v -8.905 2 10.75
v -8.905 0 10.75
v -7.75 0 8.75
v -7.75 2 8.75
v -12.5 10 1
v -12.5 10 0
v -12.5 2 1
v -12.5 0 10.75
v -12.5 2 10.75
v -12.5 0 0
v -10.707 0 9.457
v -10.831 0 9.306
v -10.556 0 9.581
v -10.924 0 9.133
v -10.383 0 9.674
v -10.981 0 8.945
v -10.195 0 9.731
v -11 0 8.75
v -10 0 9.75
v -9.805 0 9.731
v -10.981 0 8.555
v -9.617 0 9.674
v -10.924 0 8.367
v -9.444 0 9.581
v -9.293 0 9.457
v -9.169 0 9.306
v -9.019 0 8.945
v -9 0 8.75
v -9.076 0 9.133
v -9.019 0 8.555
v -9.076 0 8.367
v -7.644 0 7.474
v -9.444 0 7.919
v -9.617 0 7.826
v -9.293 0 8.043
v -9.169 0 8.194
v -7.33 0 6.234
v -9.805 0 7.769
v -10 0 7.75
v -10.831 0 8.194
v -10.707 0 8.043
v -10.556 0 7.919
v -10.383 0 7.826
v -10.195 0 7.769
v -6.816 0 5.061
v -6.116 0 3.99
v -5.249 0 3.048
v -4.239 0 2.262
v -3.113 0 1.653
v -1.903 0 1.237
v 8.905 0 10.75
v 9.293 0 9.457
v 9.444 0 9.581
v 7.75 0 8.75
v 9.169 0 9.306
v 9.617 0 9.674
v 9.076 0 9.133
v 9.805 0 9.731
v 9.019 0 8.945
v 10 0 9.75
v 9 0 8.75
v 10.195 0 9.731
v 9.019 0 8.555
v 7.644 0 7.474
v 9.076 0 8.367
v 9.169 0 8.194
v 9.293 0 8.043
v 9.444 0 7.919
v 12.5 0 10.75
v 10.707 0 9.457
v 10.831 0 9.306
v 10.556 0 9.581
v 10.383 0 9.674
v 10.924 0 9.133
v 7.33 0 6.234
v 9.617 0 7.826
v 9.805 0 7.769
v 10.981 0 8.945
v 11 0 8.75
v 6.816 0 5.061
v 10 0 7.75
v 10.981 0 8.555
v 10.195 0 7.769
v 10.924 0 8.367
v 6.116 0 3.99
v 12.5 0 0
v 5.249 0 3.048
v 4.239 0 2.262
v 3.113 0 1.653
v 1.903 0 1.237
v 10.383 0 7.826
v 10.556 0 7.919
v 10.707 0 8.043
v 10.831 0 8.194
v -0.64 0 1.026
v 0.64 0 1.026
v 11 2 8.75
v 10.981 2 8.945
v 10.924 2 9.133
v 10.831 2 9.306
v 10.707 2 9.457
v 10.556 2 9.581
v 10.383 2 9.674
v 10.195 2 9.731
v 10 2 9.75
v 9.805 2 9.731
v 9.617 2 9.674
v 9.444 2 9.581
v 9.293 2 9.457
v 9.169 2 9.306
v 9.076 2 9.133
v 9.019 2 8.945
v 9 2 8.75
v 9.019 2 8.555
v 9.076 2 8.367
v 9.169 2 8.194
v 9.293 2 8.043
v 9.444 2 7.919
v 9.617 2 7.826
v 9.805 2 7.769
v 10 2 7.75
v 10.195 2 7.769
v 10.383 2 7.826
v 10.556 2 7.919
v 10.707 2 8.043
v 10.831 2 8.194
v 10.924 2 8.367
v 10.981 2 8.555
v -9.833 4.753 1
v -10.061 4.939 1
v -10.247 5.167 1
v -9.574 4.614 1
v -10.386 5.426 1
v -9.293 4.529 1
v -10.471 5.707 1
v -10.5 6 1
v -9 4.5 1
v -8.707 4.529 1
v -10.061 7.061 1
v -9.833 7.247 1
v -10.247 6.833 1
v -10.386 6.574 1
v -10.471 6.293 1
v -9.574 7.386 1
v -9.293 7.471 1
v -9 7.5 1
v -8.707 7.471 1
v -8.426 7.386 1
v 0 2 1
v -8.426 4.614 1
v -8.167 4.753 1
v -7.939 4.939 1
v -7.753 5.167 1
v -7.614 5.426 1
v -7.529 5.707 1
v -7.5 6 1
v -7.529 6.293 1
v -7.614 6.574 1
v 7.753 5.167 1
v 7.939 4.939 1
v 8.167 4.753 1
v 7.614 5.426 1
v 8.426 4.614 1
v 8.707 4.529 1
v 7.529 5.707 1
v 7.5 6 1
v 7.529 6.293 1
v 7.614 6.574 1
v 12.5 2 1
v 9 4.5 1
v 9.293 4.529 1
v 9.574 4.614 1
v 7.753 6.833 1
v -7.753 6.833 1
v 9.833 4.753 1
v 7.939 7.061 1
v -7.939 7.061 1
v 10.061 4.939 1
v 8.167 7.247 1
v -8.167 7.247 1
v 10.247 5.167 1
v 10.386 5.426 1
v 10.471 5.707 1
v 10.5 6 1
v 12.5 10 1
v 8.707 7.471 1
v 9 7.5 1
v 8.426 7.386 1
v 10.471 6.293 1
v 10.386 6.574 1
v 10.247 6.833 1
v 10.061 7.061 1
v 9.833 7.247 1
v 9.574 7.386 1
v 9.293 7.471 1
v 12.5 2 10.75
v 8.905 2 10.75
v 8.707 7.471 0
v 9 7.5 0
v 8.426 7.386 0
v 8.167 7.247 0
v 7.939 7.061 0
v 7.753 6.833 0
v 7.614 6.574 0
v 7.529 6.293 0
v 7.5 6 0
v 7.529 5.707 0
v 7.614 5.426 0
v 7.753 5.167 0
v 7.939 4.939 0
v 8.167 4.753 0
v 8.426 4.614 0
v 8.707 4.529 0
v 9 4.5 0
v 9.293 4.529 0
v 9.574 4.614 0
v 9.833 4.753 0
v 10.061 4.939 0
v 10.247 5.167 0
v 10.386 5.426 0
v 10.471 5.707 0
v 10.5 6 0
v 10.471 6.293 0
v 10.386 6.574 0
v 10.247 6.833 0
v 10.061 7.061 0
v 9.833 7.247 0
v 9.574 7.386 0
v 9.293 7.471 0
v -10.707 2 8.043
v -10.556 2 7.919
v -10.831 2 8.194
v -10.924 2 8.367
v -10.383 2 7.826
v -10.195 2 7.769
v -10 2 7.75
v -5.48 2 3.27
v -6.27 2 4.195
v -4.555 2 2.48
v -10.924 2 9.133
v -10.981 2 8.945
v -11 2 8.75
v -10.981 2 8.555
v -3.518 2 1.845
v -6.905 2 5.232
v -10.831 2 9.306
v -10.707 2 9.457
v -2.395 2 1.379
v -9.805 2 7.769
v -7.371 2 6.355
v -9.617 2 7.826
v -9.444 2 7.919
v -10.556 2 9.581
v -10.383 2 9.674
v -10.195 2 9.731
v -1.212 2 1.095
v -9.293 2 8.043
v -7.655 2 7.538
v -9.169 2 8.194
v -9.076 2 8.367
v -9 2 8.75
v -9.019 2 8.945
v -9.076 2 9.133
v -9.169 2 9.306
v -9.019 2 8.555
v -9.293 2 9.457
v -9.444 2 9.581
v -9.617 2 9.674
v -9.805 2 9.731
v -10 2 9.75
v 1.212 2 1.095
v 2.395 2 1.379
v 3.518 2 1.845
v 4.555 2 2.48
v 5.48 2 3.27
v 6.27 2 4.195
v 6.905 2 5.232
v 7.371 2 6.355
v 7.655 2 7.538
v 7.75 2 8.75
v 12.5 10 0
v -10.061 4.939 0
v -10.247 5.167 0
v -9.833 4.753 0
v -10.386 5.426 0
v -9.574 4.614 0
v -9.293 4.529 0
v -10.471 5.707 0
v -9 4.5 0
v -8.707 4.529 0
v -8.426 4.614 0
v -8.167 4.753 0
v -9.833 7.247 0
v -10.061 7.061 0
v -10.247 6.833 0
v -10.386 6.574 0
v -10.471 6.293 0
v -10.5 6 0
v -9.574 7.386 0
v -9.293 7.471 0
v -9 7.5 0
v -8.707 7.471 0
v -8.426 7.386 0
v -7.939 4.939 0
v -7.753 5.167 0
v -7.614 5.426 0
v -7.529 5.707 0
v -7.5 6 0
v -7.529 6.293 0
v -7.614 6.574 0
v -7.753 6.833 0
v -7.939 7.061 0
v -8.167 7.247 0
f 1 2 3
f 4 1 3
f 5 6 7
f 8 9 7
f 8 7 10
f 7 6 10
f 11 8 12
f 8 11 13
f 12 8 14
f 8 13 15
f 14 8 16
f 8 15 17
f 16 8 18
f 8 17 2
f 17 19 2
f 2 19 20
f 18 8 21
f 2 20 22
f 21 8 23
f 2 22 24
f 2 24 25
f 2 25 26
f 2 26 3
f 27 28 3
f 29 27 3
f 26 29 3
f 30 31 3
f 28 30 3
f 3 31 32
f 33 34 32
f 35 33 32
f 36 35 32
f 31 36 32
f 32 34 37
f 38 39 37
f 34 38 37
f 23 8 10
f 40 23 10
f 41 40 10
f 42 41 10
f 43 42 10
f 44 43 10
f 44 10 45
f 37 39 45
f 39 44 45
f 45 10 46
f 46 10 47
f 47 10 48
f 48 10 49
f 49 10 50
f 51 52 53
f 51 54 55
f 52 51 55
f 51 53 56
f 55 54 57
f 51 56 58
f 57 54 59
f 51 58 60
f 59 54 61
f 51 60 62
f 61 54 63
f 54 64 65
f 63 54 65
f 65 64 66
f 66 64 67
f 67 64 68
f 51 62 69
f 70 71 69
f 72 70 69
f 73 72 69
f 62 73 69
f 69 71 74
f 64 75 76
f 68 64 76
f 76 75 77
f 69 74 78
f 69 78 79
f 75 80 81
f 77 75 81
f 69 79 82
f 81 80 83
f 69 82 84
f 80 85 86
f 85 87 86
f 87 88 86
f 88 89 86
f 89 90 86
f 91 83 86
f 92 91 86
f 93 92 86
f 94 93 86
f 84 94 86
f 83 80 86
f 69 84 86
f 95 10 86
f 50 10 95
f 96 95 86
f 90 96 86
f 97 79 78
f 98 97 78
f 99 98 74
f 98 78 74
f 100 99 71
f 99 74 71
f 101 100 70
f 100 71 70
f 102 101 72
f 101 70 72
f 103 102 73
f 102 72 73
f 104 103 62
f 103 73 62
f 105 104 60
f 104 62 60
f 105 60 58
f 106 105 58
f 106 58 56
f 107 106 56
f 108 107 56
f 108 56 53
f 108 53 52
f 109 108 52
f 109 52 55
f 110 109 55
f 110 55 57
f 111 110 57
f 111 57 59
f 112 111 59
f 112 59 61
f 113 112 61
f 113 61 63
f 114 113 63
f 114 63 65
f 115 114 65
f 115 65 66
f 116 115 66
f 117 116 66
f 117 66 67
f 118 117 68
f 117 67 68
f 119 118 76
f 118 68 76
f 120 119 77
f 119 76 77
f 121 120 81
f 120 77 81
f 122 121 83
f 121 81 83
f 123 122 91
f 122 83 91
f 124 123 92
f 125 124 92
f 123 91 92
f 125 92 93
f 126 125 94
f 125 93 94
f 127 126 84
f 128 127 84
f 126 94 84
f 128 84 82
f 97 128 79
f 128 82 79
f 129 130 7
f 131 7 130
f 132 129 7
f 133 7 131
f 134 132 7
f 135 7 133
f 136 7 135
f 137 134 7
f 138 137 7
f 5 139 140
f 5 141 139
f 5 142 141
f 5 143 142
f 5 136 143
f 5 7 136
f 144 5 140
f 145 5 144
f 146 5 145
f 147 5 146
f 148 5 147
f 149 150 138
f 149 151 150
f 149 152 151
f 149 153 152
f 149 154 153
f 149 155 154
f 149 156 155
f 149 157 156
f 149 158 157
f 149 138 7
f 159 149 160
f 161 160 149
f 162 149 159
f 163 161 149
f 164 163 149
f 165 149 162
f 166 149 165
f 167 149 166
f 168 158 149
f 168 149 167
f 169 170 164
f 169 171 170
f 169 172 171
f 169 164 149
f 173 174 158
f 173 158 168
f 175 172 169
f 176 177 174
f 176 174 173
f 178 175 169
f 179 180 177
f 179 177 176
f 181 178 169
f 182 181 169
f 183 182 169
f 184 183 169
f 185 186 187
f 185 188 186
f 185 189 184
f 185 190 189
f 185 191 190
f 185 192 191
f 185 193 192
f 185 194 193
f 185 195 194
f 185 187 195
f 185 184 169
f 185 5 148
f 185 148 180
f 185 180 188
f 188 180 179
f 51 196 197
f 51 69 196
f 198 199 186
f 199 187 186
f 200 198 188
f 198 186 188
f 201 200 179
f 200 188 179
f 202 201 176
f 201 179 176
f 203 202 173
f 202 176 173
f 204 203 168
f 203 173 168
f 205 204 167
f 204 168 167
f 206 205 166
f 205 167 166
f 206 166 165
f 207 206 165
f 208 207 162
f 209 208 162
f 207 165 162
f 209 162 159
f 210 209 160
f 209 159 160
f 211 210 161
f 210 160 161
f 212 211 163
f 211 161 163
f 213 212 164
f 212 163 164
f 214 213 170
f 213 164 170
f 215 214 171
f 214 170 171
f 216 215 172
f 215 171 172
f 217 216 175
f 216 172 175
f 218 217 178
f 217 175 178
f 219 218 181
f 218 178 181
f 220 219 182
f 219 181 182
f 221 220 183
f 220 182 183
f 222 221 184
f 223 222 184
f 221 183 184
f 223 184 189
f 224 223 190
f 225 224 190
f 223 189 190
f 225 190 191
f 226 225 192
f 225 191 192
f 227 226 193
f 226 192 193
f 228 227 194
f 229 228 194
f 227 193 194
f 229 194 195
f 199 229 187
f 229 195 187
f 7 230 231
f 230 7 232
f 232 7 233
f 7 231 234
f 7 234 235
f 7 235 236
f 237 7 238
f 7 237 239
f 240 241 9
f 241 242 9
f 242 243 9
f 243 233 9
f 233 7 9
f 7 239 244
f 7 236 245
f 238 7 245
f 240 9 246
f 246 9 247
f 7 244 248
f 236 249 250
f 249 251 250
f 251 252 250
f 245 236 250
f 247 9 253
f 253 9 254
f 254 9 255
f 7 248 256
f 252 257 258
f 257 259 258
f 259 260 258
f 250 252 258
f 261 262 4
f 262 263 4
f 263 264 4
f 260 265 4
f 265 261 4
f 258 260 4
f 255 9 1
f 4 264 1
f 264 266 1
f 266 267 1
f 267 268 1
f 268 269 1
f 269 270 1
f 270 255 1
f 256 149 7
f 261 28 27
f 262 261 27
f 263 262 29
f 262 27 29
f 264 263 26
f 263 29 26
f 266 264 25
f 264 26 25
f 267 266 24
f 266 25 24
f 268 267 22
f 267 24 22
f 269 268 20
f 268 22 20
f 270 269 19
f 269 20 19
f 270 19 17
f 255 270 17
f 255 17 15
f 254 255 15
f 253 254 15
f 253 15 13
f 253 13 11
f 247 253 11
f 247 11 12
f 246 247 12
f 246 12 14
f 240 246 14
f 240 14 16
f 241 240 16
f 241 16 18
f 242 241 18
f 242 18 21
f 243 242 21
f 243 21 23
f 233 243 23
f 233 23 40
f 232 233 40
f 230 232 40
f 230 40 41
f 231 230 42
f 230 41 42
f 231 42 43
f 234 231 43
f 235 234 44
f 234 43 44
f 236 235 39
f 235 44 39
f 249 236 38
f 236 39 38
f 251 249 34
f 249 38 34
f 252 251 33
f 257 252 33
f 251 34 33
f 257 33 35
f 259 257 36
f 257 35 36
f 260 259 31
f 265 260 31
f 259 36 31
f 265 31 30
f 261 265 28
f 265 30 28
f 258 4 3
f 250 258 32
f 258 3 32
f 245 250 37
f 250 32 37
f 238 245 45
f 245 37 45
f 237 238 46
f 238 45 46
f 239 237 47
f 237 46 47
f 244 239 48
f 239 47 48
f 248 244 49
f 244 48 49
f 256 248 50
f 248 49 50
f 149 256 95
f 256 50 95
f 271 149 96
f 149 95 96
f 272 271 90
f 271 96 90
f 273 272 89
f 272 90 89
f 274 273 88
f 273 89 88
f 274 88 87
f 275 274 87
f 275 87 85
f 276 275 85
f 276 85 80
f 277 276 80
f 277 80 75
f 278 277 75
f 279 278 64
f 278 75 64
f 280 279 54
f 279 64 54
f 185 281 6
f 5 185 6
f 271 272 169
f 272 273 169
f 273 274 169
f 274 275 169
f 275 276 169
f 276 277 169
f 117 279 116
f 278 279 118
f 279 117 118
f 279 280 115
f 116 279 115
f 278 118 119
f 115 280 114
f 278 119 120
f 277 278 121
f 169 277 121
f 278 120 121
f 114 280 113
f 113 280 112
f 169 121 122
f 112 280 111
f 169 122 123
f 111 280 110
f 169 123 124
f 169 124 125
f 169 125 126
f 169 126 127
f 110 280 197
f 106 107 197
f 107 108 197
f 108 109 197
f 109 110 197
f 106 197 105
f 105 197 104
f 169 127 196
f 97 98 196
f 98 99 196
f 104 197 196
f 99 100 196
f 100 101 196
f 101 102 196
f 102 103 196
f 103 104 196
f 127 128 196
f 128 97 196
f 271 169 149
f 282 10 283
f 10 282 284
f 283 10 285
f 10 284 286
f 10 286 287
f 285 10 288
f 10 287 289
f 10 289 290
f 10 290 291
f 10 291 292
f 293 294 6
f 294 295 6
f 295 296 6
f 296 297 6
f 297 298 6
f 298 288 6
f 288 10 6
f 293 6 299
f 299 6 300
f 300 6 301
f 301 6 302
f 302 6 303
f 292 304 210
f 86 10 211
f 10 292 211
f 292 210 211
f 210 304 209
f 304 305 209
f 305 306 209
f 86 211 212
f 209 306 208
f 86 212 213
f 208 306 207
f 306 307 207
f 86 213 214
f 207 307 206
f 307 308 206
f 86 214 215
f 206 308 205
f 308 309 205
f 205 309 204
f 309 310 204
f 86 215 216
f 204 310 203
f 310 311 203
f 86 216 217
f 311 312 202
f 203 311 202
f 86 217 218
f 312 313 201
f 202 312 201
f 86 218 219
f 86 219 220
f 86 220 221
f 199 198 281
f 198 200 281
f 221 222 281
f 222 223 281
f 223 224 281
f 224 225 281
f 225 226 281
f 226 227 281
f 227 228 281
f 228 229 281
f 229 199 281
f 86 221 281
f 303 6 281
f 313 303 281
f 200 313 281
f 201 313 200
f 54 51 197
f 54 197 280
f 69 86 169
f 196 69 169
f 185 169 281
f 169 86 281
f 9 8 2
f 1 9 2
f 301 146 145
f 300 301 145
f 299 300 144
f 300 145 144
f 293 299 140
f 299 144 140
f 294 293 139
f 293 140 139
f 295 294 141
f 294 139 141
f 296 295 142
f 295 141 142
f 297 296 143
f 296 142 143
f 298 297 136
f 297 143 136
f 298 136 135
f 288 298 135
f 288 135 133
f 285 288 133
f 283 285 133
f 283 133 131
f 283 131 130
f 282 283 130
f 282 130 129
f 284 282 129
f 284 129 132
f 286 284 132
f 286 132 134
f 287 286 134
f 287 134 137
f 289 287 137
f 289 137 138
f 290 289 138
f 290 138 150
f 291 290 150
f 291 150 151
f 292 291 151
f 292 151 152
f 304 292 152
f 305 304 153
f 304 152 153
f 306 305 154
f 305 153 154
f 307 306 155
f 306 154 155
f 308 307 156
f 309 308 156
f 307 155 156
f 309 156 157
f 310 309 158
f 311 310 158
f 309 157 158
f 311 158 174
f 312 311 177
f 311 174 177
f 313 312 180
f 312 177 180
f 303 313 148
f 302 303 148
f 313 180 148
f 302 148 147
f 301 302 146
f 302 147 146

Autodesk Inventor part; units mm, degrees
ref_plane "YZ Plane" through (0, 0, 0) normal (1, 0, 0) x (0, 1, 0)
ref_plane "XZ Plane" through (0, 0, 0) normal (0, 1, 0) x (-1, 0, 0)
ref_plane "XY Plane" through (0, 0, 0) normal (0, 0, 1) x (1, 0, 0)
sketch "スケッチ1" plane through (0, 0, 0) normal (0, 0, 1) x (1, 0, 0)
  line L0 (-12.5, 0) -> (12.5, 0)
  line L1 (12.5, 0) -> (12.5, 10)
  line L2 (12.5, 10) -> (-12.5, 10)
  line L3 (-12.5, 10) -> (-12.5, 0)
  point P0 (0, 0)
  point P1 (0, 0)
  dimension "d0" = 25
  dimension "d1" = 10
extrude "押し出し1" add sketch "スケッチ1" along normal blind 1
sketch "スケッチ2" plane through (-12.5, 0, 0) normal (0, -1, 0) x (1, 0, 0)
  line L0 (12.5, 0) -> (12.5, 16.3622) construction
  circle A0 centre (12.5, 8.75) radius 7.75
  line L1 (0, 1) -> (25, 1) construction
  line L2 (-3.4099, 8.75) -> (28.4099, 8.75) construction
  circle A1 centre (2.5, 8.75) radius 1
  circle A2 centre (22.5, 8.75) radius 1
  line L3 (0, 1) -> (0, 10.75)
  line L4 (0, 1) -> (25, 1)
  line L5 (25, 1) -> (25, 10.75)
  line L6 (0, 10.75) -> (3.5953, 10.75)
  line L7 (3.5953, 10.75) -> (4.75, 8.75)
  line L8 (25, 10.75) -> (21.4047, 10.75)
  line L9 (21.4047, 10.75) -> (20.25, 8.75)
  point P0 (12.5, 1)
  dimension "d4" = 15.5
  dimension "d5" = 2
  dimension "d6" = 20
  dimension "d8" = 2
  dimension "d9" = 60
  dimension "d10" = 60
extrude "押し出し2" add sketch "スケッチ2" against normal blind 2 contours L9 L8 L5 L4 A0 | A0 L4 L3 L6 L7
sketch "スケッチ4" plane through (0, 0, 0) normal (0, 0, -1) x (-1, 0, 0)
  line L0 (18.7059, 6) -> (-18.7059, 6) construction
  line L1 (0, -10.402) -> (0, 10.402) construction
  line L2 (12.5, 0) -> (-12.5, 0) construction
  point P0 (0, 0)
  point P1 (0, 0)
  point P2 (0, 6)
  point P3 (9, 6)
  point P4 (-9, 6)
  dimension "d17" = 18
  dimension "d18" = 6
hole "穴1" at (-9, 6, 0) at (9, 6, 0) direction (0, 0, 1) diameter 3 end through all
equation "\"d10\" = d9"
properties part number "Stepper-D15-S18_Braket"
